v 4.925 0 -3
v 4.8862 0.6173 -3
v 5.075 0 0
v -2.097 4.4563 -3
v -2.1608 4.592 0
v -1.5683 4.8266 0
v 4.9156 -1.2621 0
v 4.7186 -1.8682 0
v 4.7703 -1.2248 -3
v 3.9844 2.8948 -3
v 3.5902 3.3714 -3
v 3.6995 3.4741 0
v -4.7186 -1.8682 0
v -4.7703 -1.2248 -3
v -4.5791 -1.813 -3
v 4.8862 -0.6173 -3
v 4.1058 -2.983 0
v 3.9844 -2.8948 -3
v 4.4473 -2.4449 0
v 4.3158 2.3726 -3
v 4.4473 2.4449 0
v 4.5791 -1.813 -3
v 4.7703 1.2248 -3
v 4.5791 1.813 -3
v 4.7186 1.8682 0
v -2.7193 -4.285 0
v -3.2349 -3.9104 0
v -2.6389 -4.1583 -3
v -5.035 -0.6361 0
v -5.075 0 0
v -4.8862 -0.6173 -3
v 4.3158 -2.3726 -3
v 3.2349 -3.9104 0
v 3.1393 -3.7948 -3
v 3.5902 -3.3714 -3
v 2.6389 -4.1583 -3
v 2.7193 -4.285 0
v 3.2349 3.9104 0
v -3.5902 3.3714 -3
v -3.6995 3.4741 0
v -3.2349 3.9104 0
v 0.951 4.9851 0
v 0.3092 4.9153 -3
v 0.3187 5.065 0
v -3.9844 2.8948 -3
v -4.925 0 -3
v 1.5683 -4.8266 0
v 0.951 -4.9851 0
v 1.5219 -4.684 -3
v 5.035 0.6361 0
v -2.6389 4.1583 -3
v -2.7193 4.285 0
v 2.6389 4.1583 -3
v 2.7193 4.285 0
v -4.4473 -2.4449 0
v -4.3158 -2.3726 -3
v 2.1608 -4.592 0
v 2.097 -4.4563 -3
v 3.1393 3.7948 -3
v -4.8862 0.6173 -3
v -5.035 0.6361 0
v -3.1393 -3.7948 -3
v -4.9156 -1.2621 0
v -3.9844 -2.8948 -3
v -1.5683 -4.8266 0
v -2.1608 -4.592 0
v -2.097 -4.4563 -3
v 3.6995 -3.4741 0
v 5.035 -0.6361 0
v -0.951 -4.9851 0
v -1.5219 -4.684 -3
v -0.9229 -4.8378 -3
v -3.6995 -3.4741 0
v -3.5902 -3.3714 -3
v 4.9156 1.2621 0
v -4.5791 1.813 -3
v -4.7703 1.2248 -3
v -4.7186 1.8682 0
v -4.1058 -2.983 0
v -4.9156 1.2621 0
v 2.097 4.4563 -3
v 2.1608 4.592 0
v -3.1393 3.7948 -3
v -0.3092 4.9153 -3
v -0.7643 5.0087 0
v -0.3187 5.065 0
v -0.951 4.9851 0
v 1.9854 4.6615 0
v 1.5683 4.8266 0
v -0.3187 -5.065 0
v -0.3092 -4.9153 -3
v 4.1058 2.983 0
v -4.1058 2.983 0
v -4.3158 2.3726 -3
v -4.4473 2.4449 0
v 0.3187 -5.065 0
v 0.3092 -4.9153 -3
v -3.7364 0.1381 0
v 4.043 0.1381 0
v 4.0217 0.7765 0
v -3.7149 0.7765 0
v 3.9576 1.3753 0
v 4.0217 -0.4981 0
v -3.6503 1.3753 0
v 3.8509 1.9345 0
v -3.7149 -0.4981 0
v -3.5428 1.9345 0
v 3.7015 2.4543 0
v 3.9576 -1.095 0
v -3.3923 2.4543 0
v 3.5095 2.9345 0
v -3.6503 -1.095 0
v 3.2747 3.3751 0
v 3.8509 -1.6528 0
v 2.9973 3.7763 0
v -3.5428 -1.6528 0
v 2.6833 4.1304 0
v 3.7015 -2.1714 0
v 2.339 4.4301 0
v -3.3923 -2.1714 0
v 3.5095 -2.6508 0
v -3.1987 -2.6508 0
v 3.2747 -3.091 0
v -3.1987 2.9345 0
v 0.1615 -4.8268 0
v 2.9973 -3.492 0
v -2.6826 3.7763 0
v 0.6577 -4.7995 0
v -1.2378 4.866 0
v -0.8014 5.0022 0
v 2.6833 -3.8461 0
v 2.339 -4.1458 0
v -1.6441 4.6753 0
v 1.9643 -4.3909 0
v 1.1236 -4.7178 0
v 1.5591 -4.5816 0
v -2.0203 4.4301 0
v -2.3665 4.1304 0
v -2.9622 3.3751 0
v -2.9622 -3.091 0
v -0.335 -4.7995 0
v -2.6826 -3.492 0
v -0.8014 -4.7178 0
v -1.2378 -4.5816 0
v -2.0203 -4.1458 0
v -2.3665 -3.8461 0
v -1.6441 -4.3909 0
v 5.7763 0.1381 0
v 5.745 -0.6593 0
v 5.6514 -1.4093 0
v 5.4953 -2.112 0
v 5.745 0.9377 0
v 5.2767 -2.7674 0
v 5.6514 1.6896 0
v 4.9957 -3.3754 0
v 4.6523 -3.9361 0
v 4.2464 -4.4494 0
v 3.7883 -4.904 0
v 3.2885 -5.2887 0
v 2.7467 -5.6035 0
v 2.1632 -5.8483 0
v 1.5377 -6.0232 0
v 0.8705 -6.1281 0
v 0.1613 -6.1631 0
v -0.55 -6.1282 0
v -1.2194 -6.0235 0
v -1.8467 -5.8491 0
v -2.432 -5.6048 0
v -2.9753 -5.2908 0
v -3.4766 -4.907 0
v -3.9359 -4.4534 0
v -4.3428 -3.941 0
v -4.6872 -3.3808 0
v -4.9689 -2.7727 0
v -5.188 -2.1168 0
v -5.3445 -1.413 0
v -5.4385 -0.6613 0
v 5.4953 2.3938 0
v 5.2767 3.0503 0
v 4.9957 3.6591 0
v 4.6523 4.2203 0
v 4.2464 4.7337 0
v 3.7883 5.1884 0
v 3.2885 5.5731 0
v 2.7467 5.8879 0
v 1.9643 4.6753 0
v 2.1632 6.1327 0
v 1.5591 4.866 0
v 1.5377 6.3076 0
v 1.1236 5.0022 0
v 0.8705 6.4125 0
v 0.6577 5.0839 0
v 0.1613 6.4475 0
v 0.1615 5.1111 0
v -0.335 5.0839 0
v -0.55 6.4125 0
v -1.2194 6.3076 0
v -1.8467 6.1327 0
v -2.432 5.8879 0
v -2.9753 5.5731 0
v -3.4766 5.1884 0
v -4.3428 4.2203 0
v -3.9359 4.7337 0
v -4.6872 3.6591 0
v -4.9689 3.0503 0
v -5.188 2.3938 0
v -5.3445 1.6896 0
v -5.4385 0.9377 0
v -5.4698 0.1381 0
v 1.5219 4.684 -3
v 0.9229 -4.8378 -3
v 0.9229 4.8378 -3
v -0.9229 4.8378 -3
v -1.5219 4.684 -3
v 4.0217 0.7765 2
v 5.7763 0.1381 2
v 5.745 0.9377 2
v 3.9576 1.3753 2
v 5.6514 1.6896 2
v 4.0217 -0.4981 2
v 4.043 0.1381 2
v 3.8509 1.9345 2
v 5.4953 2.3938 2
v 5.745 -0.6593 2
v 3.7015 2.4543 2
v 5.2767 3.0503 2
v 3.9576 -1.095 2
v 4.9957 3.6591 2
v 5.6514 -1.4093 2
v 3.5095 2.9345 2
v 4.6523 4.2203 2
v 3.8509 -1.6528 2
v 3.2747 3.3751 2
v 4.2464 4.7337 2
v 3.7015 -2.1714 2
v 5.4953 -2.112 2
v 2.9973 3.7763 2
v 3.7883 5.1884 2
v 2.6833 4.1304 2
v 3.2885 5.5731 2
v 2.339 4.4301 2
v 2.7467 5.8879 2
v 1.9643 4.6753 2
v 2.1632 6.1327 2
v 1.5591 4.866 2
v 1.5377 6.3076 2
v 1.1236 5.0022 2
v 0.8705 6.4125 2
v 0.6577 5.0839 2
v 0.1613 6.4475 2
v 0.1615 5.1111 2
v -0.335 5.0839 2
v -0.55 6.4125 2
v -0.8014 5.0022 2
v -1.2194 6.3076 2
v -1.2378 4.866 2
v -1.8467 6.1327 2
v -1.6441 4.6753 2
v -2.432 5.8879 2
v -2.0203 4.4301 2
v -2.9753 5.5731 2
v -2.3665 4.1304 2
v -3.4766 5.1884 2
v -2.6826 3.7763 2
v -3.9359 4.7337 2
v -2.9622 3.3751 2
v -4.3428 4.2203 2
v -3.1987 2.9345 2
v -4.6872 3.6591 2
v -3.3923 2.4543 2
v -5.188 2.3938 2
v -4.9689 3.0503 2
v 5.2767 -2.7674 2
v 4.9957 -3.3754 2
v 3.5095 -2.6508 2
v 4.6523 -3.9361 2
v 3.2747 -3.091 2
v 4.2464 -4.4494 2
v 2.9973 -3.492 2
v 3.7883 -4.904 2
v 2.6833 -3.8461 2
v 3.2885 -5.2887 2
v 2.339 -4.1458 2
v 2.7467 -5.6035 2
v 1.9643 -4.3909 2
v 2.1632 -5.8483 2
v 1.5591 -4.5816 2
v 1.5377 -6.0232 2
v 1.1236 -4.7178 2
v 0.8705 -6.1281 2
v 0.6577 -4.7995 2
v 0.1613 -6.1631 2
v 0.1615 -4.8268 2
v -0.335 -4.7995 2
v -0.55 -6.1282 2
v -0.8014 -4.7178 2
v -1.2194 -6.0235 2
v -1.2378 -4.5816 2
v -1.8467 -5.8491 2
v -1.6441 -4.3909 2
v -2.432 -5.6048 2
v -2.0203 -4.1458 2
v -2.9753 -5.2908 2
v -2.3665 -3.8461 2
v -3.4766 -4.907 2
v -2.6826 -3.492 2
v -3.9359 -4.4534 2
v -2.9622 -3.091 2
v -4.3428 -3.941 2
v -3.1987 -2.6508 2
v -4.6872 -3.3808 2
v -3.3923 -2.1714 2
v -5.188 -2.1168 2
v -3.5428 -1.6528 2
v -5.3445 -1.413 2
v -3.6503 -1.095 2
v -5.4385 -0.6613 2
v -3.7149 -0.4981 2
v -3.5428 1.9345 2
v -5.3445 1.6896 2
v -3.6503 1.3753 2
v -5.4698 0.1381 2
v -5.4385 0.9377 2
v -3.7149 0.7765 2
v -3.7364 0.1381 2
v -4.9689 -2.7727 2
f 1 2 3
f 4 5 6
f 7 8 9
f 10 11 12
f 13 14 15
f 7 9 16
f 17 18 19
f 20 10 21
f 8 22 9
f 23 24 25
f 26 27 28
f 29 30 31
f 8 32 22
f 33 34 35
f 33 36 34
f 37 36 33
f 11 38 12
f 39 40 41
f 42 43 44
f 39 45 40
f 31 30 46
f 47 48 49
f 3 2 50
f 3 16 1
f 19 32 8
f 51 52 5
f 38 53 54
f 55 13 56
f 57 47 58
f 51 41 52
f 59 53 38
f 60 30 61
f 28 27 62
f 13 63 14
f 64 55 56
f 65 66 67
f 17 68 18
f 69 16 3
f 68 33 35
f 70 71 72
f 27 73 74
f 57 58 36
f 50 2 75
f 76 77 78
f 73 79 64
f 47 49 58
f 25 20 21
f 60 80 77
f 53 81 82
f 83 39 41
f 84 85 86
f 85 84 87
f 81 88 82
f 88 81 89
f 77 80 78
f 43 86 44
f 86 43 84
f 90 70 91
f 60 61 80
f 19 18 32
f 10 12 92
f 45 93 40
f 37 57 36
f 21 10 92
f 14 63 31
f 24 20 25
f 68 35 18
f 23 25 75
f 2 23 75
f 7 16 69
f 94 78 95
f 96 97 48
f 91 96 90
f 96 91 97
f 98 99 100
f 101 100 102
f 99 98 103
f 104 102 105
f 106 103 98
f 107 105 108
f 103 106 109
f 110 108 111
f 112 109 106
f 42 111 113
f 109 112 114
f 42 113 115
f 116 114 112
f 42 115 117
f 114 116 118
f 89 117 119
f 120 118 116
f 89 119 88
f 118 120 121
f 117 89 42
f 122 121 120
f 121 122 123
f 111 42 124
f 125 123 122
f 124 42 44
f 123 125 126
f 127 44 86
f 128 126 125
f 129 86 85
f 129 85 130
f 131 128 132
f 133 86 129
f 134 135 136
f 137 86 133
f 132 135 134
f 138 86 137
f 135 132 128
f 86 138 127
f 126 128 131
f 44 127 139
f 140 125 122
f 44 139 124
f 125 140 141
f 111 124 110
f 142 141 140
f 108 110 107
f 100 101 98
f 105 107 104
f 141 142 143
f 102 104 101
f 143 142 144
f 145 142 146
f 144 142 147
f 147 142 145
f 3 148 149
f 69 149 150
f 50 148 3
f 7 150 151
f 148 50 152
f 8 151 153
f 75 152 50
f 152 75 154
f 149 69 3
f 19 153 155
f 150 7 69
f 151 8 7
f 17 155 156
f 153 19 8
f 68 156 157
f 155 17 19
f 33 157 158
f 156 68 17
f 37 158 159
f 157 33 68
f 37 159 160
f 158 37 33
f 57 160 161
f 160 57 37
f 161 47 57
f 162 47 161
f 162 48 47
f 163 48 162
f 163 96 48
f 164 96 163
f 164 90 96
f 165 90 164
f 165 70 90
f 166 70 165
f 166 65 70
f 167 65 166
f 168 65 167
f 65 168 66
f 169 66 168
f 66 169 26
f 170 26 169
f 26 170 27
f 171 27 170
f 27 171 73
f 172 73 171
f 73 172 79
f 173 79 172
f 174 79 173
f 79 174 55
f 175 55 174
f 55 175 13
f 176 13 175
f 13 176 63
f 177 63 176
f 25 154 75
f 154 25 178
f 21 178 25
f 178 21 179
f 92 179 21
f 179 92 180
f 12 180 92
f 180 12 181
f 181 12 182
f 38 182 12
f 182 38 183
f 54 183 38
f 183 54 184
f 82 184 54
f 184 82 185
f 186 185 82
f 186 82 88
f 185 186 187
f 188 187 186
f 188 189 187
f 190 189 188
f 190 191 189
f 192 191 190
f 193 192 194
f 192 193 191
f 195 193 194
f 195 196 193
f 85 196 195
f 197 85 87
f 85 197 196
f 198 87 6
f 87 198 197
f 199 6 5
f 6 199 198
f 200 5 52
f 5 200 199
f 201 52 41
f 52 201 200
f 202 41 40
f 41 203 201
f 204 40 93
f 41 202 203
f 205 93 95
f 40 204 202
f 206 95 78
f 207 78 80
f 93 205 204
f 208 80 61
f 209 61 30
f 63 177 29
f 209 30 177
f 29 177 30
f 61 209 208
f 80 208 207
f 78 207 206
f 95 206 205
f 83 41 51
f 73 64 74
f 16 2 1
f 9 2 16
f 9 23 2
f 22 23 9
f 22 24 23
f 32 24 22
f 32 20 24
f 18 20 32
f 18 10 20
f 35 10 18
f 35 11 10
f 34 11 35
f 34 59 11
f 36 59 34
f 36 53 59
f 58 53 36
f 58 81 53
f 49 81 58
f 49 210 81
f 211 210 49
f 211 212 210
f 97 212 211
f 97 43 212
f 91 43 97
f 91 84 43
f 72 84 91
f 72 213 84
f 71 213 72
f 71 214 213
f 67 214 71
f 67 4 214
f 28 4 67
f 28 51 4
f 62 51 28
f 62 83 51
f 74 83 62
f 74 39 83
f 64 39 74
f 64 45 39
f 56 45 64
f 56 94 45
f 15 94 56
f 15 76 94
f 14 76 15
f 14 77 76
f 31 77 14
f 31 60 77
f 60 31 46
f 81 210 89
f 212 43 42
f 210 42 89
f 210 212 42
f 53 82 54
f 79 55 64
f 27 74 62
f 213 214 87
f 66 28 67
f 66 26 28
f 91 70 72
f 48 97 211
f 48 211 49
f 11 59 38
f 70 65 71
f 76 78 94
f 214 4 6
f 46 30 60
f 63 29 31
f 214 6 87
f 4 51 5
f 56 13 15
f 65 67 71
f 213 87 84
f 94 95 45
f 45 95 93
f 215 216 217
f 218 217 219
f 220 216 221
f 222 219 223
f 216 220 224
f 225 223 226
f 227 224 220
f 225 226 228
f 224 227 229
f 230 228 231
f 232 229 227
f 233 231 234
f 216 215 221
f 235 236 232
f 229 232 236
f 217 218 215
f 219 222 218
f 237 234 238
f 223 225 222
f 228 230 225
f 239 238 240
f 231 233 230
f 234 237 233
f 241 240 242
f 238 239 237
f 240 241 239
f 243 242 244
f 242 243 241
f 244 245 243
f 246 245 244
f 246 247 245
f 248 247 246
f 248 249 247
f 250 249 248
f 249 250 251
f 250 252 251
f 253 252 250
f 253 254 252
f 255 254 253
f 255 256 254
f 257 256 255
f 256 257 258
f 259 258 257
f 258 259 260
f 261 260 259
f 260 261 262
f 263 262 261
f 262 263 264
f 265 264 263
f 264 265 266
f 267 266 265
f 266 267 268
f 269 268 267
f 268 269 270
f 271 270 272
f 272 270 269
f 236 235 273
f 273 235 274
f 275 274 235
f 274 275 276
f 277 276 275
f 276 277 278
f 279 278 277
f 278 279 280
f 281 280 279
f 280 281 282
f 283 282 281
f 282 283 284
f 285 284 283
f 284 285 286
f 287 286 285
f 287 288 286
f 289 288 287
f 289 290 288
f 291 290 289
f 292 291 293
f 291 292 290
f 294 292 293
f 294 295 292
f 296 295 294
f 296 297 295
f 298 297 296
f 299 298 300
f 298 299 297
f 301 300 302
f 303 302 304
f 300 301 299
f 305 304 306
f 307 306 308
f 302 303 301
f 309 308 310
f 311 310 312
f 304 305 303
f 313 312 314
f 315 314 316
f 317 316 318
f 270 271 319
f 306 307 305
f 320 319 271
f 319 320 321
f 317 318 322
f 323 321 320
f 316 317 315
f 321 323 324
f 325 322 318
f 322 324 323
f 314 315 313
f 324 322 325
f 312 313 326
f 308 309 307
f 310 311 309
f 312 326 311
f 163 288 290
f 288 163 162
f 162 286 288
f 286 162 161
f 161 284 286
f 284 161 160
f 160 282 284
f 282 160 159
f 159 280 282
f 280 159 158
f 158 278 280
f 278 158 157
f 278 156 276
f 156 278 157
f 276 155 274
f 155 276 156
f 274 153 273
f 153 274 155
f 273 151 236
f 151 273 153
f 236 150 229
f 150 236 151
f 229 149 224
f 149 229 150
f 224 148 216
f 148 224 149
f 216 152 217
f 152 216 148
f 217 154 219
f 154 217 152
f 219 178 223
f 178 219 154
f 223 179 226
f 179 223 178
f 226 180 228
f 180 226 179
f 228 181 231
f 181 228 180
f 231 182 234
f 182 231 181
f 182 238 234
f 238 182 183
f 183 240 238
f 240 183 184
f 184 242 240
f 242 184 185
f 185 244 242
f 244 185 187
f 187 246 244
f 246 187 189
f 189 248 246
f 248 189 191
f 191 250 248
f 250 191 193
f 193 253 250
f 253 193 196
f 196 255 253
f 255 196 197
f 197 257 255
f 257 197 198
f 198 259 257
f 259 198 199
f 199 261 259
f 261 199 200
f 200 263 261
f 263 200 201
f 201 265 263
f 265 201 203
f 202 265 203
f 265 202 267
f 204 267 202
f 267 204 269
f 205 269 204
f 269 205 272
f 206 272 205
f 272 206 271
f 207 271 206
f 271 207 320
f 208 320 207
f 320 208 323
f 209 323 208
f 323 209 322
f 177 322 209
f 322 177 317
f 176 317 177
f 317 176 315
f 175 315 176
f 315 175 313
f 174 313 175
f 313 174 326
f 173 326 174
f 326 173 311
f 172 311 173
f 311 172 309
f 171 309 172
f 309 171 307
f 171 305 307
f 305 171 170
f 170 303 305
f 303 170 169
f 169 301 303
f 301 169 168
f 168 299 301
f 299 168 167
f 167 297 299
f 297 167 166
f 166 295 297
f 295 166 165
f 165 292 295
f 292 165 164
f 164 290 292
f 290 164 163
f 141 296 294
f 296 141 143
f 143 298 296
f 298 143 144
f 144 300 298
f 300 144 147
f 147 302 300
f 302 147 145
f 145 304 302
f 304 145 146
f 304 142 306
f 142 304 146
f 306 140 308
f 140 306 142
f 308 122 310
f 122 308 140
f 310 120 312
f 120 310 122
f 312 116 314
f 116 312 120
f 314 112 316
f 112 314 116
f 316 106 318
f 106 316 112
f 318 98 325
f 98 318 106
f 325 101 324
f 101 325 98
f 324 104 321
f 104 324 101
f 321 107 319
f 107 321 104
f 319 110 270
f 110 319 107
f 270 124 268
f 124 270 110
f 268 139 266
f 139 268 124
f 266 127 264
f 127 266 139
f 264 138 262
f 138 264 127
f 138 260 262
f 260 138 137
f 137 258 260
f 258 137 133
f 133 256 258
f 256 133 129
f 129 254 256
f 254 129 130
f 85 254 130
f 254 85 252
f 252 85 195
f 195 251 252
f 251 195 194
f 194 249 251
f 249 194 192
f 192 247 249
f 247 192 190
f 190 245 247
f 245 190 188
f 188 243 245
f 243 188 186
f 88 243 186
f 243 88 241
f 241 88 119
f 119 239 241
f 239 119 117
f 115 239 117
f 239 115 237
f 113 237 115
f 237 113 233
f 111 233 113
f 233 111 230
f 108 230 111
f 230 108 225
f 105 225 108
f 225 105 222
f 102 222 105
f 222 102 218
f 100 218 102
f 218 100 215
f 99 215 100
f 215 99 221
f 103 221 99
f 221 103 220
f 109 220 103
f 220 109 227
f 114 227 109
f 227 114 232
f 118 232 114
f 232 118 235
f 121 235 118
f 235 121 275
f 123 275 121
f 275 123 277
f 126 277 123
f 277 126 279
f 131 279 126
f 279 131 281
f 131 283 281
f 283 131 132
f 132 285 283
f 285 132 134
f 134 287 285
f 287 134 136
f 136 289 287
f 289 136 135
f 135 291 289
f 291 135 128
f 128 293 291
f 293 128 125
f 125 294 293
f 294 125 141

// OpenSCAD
$fn = 50;


difference() {
	union() {
		translate(v = [0, 0, -3.0000000000]) {
			cylinder(h = 3, r1 = 4.9250000000, r2 = 5.0750000000);
		}
		linear_extrude(height = 2) {
			text(font = "Impact", halign = "center", size = 12, text = "O", valign = "center");
		}
	}
	union();
}
